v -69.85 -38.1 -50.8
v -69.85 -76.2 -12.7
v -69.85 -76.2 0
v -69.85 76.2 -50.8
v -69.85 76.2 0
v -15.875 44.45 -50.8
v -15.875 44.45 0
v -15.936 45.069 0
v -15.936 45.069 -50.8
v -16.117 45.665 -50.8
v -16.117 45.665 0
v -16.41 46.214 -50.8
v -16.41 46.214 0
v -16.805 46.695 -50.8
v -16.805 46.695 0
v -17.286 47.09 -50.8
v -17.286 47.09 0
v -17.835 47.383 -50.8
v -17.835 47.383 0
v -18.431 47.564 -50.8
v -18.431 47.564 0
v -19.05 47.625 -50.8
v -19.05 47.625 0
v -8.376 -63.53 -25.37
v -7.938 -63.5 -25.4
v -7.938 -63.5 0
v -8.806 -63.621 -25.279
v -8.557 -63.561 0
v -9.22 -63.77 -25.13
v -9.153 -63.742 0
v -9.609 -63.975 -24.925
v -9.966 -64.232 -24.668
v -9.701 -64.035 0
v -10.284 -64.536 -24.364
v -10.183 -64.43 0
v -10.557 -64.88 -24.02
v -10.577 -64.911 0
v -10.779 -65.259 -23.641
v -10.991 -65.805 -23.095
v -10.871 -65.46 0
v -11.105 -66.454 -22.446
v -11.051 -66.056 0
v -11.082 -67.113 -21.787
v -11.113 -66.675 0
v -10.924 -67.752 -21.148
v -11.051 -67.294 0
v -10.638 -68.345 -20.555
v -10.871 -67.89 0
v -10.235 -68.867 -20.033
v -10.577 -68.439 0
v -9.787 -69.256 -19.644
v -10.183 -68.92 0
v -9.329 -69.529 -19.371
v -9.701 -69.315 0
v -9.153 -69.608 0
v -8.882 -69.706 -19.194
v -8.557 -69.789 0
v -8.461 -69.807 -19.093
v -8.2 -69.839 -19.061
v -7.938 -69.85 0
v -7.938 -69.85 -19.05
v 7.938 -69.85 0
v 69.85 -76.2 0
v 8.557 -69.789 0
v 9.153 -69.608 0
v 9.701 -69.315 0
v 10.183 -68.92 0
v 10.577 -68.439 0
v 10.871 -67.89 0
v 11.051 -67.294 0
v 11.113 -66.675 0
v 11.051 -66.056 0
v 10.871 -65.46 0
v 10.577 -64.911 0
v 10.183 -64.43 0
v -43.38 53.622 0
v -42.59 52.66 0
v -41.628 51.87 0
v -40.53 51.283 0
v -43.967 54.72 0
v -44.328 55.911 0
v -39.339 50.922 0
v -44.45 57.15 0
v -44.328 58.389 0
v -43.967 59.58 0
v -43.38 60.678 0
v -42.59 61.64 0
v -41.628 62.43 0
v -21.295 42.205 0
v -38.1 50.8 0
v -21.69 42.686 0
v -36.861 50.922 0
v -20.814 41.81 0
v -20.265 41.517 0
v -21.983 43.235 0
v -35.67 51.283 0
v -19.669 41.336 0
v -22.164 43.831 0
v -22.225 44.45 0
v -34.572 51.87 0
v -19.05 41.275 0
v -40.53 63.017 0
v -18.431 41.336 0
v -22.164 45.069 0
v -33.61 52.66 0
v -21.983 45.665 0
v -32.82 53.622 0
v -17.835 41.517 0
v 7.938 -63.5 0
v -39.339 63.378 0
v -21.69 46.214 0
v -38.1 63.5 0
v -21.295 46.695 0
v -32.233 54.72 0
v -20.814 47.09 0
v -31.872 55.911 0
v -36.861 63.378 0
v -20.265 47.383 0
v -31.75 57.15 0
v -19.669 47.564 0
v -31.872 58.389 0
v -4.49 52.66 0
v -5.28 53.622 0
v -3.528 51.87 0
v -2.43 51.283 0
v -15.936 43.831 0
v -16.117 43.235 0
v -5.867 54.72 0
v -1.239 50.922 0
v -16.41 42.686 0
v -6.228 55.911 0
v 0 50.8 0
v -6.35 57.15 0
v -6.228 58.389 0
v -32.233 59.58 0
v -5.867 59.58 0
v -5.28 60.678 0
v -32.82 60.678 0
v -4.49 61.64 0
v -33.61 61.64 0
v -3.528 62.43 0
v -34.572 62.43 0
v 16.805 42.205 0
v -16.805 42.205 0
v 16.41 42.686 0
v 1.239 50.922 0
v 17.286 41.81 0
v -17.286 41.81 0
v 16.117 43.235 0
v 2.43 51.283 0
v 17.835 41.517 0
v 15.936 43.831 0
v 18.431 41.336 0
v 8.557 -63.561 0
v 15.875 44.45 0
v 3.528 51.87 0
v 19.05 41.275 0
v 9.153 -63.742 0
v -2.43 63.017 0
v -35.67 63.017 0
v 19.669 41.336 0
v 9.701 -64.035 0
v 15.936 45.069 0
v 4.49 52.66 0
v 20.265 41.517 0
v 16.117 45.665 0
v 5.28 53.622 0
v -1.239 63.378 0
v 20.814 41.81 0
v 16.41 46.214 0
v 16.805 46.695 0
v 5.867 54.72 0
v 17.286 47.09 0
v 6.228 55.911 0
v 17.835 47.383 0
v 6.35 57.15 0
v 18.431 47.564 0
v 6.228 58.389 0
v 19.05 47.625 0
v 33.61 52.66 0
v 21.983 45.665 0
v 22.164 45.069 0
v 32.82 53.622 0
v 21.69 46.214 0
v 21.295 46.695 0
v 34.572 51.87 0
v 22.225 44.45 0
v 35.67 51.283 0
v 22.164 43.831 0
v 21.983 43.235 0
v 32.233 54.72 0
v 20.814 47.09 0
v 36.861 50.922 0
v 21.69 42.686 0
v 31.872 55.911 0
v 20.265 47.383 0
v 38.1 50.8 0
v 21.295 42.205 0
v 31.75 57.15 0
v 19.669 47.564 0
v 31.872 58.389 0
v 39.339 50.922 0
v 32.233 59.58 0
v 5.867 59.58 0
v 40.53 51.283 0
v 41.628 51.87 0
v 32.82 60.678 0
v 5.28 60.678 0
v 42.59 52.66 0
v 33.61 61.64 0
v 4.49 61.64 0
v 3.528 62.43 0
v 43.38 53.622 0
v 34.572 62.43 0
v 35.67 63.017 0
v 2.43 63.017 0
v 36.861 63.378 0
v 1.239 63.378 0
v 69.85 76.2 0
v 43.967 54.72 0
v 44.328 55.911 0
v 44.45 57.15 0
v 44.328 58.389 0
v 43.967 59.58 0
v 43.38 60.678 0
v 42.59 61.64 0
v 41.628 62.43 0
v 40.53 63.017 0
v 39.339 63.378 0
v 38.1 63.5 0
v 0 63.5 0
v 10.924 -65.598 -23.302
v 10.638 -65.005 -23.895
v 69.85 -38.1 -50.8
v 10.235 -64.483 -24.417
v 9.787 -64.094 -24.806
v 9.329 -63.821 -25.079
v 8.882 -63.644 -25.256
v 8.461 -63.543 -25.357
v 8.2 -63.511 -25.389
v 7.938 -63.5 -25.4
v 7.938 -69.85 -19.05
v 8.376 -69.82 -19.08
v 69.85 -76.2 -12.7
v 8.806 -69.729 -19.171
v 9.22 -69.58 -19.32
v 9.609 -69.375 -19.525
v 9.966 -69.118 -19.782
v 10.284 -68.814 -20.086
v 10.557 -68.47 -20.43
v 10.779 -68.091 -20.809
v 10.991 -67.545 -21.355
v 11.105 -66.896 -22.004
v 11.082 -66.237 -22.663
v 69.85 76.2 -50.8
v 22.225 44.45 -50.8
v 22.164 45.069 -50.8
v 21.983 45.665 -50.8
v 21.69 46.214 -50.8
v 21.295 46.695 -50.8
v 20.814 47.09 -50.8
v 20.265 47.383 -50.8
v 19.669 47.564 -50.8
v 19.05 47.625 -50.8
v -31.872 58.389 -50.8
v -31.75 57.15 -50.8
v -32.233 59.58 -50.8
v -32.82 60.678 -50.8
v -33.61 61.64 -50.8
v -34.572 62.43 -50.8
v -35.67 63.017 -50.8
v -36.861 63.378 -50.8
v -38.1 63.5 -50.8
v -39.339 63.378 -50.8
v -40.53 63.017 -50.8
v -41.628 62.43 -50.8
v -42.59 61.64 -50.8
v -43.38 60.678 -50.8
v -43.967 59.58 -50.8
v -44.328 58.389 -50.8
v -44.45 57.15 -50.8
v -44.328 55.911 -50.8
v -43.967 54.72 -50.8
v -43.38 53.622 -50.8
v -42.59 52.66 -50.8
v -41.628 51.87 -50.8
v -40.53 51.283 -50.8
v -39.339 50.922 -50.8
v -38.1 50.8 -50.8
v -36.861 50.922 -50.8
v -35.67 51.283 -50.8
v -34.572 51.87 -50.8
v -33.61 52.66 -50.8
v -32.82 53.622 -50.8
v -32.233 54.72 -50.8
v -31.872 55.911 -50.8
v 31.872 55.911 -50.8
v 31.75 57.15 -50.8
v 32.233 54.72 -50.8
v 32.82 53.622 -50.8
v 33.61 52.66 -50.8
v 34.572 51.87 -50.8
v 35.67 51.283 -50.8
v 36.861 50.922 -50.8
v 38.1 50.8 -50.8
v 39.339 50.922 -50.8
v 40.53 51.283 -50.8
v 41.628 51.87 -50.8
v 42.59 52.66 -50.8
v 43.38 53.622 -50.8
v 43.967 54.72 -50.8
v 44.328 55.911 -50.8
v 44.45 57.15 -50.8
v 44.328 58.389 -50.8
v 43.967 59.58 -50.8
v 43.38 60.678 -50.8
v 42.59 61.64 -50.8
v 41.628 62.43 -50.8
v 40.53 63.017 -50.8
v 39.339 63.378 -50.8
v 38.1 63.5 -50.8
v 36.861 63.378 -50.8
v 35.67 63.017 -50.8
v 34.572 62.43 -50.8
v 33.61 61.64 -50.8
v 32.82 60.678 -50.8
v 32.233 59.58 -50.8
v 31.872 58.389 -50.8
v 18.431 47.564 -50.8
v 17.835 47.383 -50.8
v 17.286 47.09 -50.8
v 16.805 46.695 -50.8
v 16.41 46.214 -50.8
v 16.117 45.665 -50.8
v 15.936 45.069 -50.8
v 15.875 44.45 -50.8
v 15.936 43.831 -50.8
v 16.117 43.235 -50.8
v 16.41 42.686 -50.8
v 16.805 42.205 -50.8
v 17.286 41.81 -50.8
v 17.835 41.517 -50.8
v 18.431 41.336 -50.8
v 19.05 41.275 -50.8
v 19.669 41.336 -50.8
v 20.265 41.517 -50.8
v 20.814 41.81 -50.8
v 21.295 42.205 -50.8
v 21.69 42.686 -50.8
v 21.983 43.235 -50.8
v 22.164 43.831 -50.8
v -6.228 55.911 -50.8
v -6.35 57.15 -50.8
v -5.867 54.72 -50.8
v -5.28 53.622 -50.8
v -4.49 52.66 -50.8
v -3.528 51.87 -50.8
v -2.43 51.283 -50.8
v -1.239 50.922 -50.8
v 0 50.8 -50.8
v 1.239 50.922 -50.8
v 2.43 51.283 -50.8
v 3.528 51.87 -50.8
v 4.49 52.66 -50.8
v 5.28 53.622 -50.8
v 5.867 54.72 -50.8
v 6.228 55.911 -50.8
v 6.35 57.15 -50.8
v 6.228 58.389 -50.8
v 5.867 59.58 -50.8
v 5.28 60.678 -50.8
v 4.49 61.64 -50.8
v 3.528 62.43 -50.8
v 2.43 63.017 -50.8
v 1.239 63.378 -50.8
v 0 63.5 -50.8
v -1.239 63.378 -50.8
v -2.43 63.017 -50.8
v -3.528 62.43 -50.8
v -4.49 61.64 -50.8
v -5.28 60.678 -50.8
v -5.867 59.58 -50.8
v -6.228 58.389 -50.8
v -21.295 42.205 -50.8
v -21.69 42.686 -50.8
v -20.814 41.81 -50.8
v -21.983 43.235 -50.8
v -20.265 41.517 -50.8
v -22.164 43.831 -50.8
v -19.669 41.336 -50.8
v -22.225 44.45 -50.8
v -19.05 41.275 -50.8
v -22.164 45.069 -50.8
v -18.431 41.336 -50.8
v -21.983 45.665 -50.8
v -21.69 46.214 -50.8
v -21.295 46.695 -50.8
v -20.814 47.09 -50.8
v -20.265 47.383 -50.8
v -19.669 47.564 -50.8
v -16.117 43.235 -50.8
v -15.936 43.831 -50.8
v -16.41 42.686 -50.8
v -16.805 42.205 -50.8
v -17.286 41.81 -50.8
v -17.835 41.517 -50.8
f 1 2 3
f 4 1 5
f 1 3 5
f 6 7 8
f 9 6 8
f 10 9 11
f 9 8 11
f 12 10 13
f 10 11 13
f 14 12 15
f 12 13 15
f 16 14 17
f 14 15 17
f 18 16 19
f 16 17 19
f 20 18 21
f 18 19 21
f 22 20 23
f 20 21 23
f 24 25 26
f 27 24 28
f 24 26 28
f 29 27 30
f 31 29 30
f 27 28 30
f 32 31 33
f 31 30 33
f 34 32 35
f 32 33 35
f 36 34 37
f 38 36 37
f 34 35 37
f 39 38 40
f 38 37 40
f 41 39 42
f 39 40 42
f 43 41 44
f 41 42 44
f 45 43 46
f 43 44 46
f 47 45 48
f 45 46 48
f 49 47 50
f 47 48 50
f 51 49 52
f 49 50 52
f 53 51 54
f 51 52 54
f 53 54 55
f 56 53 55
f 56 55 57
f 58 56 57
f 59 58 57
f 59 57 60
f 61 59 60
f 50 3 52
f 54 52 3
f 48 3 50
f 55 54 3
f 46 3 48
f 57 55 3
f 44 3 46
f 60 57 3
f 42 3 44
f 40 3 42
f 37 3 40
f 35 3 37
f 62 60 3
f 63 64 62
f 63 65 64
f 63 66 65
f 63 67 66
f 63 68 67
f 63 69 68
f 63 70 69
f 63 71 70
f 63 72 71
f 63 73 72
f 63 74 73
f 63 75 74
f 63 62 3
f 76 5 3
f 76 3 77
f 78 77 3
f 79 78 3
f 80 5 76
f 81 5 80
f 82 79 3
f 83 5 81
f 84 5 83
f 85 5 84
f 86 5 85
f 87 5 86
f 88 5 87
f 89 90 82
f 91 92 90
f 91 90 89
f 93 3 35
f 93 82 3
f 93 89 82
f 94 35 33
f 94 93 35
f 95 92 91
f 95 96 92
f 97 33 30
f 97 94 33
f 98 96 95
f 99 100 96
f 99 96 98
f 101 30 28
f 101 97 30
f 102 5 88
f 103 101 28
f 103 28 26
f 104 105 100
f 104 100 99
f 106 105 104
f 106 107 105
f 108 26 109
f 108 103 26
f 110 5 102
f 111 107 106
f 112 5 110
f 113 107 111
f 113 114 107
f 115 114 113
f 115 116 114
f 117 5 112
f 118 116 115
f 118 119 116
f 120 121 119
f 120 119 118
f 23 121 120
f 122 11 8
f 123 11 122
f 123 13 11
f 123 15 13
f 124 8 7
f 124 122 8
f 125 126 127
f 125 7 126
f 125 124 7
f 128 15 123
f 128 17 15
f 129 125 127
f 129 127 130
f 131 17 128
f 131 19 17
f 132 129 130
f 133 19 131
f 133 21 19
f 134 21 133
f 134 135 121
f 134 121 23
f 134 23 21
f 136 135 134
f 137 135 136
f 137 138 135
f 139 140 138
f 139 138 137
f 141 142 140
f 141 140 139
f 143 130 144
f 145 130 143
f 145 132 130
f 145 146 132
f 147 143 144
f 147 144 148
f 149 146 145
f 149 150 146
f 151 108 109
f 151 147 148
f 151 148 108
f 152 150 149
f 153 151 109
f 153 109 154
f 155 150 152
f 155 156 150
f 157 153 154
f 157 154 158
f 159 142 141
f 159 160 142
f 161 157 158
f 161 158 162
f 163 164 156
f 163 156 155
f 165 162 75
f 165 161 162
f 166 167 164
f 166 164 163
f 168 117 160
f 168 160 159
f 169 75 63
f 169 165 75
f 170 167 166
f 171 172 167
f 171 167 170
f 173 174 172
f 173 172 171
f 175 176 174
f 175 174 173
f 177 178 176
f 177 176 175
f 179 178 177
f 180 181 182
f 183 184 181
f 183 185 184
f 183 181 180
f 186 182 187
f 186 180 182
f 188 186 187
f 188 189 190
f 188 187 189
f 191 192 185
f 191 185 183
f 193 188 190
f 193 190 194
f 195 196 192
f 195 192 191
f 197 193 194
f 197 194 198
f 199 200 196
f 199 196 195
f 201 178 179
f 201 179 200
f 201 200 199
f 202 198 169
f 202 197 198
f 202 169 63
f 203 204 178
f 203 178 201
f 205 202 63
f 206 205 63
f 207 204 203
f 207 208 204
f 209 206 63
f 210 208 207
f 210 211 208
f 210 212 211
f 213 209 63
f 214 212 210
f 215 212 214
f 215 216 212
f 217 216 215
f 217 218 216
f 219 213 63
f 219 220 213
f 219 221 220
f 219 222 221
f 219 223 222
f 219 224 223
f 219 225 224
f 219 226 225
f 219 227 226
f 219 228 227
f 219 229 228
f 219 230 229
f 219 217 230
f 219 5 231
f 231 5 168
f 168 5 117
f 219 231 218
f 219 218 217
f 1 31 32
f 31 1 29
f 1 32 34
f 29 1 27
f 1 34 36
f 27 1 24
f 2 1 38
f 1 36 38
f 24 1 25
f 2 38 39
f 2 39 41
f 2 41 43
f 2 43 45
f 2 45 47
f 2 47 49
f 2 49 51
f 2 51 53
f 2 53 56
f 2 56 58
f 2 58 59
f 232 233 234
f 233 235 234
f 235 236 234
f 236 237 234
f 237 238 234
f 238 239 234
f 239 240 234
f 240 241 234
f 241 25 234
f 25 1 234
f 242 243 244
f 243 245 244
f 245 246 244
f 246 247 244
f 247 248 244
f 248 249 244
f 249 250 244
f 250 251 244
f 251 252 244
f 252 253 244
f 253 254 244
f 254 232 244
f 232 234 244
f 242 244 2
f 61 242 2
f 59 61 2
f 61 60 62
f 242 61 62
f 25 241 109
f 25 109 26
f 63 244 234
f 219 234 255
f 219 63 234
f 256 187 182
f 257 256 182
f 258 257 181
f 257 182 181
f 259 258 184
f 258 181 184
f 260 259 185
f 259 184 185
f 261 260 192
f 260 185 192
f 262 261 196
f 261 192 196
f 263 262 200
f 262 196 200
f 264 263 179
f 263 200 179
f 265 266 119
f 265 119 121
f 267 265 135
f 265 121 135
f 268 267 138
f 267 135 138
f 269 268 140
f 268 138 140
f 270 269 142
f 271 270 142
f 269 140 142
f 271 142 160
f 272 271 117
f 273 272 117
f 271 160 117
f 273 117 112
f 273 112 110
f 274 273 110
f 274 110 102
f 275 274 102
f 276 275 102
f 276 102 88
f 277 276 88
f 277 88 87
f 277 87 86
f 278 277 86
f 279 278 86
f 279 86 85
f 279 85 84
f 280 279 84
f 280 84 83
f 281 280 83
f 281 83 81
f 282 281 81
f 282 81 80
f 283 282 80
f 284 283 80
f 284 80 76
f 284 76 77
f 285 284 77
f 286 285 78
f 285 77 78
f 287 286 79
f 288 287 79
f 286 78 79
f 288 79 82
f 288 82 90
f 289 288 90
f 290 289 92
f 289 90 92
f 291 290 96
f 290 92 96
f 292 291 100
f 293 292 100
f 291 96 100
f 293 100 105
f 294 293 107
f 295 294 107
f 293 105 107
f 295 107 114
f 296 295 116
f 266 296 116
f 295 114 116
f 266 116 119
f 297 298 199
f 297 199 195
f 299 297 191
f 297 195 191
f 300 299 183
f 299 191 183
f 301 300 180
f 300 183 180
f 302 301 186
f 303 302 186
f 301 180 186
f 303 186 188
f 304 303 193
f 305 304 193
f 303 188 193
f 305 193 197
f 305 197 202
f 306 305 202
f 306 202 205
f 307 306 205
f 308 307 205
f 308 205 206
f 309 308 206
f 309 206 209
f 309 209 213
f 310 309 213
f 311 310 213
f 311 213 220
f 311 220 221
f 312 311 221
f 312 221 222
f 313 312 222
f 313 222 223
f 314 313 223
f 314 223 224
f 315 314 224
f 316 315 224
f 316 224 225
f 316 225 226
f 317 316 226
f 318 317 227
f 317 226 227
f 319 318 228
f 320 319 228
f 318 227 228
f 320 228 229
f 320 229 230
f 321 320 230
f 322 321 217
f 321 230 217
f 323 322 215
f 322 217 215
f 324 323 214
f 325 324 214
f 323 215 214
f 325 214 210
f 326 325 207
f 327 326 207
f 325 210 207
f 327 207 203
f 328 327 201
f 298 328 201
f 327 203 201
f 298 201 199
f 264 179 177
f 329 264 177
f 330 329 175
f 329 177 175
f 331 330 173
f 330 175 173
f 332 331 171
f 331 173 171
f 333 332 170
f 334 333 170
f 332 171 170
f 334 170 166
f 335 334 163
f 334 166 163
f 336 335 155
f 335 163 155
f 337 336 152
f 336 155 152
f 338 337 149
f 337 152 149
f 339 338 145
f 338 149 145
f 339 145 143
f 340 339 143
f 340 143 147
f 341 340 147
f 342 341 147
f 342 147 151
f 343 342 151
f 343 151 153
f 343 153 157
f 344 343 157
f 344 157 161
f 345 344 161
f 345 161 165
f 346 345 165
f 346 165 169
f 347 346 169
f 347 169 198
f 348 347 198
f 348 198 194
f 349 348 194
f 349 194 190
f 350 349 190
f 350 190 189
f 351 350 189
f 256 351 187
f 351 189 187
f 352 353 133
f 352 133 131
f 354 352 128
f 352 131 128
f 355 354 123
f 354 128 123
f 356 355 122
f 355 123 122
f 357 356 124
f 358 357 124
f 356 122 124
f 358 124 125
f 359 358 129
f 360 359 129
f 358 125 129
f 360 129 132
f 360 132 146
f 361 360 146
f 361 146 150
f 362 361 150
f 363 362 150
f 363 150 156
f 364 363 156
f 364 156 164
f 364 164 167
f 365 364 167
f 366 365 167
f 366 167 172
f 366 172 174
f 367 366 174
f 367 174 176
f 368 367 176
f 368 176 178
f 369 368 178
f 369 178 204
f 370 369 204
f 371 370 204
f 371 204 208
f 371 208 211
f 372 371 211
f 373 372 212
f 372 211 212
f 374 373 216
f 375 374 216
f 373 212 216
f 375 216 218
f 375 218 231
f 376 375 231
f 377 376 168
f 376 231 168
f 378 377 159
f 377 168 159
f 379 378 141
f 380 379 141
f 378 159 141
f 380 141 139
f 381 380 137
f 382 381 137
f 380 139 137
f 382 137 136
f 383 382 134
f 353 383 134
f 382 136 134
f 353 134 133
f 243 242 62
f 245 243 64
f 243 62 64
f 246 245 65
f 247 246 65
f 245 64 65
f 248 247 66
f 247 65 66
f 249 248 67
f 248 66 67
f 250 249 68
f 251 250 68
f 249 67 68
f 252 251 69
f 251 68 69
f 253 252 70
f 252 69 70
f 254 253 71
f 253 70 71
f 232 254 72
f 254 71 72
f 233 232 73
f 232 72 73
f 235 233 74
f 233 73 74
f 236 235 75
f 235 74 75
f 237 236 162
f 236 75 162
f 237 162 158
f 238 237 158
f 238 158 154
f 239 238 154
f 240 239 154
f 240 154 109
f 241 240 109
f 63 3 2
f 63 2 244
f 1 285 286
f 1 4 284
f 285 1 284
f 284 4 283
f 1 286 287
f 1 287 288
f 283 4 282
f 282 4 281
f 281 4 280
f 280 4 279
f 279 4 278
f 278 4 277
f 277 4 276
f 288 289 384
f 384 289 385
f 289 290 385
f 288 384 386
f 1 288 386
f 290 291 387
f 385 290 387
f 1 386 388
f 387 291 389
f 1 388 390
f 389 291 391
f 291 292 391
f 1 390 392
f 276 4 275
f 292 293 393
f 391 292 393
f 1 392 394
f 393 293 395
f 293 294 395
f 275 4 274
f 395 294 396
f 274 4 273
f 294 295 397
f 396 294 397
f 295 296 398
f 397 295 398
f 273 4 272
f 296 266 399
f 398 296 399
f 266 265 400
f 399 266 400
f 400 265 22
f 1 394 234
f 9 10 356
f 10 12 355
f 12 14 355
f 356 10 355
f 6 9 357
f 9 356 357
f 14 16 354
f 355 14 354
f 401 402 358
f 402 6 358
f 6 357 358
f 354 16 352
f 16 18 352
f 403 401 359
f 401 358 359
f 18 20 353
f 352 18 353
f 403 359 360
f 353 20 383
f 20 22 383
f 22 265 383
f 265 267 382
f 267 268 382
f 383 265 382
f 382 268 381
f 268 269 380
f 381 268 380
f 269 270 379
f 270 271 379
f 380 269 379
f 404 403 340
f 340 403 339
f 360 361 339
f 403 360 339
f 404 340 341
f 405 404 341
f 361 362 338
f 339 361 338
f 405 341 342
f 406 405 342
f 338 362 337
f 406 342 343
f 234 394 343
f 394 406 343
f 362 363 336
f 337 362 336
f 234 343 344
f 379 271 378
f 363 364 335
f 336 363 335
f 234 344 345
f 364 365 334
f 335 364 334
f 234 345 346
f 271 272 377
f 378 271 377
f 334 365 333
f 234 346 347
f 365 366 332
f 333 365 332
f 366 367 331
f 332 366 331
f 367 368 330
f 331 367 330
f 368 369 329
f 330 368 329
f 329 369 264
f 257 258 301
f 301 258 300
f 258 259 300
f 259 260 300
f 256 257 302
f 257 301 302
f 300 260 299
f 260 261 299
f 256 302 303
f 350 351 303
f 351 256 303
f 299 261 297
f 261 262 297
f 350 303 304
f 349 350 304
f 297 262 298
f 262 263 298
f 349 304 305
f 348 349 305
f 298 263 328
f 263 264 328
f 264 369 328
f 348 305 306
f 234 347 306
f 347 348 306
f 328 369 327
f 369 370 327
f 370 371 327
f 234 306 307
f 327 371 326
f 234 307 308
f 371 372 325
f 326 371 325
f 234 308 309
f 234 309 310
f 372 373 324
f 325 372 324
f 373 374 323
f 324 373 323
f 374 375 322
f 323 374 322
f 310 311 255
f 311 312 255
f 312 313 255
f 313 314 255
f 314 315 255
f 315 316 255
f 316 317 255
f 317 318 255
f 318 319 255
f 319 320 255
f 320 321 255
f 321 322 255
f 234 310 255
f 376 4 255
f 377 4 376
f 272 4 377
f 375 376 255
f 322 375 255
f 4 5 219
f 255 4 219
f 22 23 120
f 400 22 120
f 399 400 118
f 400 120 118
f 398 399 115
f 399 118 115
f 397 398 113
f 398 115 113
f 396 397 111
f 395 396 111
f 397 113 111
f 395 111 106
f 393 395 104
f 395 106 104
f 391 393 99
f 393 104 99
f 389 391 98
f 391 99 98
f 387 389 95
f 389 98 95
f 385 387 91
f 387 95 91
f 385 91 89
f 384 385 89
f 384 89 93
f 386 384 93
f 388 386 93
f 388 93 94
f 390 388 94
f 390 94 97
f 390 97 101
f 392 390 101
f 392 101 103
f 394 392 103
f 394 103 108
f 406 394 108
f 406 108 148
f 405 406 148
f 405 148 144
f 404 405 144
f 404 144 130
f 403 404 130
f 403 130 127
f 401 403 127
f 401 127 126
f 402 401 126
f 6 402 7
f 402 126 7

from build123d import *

# Parameters (mm, degrees)
F0_W     = 139.7
F0_H     = 152.4
F1_DEPTH = 50.8
F2_R     = 6.35
F3_DEPTH = 50.801
F5_DEPTH = 139.701


with BuildPart() as f1:
    # F0 (on Top) → F1 (new body)
    with BuildSketch(Plane.XY):
        Rectangle(F0_W, F0_H)
    extrude(amount=-F1_DEPTH)

    # F2 (on face) → F3 (cut, through all)
    with BuildSketch(Plane.XY):
        with BuildLine():
            Line((-7.9375, -69.85), (7.9375, -69.85))
            ThreePointArc((7.9375, -69.85), (11.1125, -66.675), (7.9375, -63.5))
            Line((7.9375, -63.5), (-7.9375, -63.5))
            ThreePointArc((-7.9375, -63.5), (-11.1125, -66.675), (-7.9375, -69.85))
        make_face()
        with BuildLine():
            Line((0, 57.15), (6.35, 57.15))
            ThreePointArc((6.35, 57.15), (0, 63.5), (-6.35, 57.15))
            Line((-6.35, 57.15), (0, 57.15))
        make_face()
        with BuildLine():
            ThreePointArc((-15.875, 44.45), (-16.804936, 46.695064), (-19.05, 47.625))
            ThreePointArc((-19.05, 47.625), (-21.295064, 42.204936), (-15.875, 44.45))
        make_face()
        with Locations((-38.1, 57.15)):
            Circle(F2_R)
        with BuildLine():
            ThreePointArc((44.45, 57.15), (38.1, 63.5), (31.75, 57.15))
            ThreePointArc((31.75, 57.15), (38.1, 50.8), (44.45, 57.15))
        make_face()
        with BuildLine():
            ThreePointArc((22.225, 44.45), (21.295064, 46.695064), (19.05, 47.625))
            ThreePointArc((19.05, 47.625), (16.804936, 42.204936), (22.225, 44.45))
        make_face()
        with BuildLine():
            ThreePointArc((-6.35, 57.15), (0, 50.8), (6.35, 57.15))
            Line((6.35, 57.15), (0, 57.15))
            Line((0, 57.15), (-6.35, 57.15))
        make_face()
    extrude(amount=-F3_DEPTH, mode=Mode.SUBTRACT)

    # F4 (on face) → F5 (cut, through all)
    with BuildSketch(Plane.YZ.offset(69.85)):
        Polygon((-76.2, -12.7), (-76.2, -50.8), (-38.1, -50.8), align=None)
    extrude(amount=-F5_DEPTH, mode=Mode.SUBTRACT)


solid = f1.part
